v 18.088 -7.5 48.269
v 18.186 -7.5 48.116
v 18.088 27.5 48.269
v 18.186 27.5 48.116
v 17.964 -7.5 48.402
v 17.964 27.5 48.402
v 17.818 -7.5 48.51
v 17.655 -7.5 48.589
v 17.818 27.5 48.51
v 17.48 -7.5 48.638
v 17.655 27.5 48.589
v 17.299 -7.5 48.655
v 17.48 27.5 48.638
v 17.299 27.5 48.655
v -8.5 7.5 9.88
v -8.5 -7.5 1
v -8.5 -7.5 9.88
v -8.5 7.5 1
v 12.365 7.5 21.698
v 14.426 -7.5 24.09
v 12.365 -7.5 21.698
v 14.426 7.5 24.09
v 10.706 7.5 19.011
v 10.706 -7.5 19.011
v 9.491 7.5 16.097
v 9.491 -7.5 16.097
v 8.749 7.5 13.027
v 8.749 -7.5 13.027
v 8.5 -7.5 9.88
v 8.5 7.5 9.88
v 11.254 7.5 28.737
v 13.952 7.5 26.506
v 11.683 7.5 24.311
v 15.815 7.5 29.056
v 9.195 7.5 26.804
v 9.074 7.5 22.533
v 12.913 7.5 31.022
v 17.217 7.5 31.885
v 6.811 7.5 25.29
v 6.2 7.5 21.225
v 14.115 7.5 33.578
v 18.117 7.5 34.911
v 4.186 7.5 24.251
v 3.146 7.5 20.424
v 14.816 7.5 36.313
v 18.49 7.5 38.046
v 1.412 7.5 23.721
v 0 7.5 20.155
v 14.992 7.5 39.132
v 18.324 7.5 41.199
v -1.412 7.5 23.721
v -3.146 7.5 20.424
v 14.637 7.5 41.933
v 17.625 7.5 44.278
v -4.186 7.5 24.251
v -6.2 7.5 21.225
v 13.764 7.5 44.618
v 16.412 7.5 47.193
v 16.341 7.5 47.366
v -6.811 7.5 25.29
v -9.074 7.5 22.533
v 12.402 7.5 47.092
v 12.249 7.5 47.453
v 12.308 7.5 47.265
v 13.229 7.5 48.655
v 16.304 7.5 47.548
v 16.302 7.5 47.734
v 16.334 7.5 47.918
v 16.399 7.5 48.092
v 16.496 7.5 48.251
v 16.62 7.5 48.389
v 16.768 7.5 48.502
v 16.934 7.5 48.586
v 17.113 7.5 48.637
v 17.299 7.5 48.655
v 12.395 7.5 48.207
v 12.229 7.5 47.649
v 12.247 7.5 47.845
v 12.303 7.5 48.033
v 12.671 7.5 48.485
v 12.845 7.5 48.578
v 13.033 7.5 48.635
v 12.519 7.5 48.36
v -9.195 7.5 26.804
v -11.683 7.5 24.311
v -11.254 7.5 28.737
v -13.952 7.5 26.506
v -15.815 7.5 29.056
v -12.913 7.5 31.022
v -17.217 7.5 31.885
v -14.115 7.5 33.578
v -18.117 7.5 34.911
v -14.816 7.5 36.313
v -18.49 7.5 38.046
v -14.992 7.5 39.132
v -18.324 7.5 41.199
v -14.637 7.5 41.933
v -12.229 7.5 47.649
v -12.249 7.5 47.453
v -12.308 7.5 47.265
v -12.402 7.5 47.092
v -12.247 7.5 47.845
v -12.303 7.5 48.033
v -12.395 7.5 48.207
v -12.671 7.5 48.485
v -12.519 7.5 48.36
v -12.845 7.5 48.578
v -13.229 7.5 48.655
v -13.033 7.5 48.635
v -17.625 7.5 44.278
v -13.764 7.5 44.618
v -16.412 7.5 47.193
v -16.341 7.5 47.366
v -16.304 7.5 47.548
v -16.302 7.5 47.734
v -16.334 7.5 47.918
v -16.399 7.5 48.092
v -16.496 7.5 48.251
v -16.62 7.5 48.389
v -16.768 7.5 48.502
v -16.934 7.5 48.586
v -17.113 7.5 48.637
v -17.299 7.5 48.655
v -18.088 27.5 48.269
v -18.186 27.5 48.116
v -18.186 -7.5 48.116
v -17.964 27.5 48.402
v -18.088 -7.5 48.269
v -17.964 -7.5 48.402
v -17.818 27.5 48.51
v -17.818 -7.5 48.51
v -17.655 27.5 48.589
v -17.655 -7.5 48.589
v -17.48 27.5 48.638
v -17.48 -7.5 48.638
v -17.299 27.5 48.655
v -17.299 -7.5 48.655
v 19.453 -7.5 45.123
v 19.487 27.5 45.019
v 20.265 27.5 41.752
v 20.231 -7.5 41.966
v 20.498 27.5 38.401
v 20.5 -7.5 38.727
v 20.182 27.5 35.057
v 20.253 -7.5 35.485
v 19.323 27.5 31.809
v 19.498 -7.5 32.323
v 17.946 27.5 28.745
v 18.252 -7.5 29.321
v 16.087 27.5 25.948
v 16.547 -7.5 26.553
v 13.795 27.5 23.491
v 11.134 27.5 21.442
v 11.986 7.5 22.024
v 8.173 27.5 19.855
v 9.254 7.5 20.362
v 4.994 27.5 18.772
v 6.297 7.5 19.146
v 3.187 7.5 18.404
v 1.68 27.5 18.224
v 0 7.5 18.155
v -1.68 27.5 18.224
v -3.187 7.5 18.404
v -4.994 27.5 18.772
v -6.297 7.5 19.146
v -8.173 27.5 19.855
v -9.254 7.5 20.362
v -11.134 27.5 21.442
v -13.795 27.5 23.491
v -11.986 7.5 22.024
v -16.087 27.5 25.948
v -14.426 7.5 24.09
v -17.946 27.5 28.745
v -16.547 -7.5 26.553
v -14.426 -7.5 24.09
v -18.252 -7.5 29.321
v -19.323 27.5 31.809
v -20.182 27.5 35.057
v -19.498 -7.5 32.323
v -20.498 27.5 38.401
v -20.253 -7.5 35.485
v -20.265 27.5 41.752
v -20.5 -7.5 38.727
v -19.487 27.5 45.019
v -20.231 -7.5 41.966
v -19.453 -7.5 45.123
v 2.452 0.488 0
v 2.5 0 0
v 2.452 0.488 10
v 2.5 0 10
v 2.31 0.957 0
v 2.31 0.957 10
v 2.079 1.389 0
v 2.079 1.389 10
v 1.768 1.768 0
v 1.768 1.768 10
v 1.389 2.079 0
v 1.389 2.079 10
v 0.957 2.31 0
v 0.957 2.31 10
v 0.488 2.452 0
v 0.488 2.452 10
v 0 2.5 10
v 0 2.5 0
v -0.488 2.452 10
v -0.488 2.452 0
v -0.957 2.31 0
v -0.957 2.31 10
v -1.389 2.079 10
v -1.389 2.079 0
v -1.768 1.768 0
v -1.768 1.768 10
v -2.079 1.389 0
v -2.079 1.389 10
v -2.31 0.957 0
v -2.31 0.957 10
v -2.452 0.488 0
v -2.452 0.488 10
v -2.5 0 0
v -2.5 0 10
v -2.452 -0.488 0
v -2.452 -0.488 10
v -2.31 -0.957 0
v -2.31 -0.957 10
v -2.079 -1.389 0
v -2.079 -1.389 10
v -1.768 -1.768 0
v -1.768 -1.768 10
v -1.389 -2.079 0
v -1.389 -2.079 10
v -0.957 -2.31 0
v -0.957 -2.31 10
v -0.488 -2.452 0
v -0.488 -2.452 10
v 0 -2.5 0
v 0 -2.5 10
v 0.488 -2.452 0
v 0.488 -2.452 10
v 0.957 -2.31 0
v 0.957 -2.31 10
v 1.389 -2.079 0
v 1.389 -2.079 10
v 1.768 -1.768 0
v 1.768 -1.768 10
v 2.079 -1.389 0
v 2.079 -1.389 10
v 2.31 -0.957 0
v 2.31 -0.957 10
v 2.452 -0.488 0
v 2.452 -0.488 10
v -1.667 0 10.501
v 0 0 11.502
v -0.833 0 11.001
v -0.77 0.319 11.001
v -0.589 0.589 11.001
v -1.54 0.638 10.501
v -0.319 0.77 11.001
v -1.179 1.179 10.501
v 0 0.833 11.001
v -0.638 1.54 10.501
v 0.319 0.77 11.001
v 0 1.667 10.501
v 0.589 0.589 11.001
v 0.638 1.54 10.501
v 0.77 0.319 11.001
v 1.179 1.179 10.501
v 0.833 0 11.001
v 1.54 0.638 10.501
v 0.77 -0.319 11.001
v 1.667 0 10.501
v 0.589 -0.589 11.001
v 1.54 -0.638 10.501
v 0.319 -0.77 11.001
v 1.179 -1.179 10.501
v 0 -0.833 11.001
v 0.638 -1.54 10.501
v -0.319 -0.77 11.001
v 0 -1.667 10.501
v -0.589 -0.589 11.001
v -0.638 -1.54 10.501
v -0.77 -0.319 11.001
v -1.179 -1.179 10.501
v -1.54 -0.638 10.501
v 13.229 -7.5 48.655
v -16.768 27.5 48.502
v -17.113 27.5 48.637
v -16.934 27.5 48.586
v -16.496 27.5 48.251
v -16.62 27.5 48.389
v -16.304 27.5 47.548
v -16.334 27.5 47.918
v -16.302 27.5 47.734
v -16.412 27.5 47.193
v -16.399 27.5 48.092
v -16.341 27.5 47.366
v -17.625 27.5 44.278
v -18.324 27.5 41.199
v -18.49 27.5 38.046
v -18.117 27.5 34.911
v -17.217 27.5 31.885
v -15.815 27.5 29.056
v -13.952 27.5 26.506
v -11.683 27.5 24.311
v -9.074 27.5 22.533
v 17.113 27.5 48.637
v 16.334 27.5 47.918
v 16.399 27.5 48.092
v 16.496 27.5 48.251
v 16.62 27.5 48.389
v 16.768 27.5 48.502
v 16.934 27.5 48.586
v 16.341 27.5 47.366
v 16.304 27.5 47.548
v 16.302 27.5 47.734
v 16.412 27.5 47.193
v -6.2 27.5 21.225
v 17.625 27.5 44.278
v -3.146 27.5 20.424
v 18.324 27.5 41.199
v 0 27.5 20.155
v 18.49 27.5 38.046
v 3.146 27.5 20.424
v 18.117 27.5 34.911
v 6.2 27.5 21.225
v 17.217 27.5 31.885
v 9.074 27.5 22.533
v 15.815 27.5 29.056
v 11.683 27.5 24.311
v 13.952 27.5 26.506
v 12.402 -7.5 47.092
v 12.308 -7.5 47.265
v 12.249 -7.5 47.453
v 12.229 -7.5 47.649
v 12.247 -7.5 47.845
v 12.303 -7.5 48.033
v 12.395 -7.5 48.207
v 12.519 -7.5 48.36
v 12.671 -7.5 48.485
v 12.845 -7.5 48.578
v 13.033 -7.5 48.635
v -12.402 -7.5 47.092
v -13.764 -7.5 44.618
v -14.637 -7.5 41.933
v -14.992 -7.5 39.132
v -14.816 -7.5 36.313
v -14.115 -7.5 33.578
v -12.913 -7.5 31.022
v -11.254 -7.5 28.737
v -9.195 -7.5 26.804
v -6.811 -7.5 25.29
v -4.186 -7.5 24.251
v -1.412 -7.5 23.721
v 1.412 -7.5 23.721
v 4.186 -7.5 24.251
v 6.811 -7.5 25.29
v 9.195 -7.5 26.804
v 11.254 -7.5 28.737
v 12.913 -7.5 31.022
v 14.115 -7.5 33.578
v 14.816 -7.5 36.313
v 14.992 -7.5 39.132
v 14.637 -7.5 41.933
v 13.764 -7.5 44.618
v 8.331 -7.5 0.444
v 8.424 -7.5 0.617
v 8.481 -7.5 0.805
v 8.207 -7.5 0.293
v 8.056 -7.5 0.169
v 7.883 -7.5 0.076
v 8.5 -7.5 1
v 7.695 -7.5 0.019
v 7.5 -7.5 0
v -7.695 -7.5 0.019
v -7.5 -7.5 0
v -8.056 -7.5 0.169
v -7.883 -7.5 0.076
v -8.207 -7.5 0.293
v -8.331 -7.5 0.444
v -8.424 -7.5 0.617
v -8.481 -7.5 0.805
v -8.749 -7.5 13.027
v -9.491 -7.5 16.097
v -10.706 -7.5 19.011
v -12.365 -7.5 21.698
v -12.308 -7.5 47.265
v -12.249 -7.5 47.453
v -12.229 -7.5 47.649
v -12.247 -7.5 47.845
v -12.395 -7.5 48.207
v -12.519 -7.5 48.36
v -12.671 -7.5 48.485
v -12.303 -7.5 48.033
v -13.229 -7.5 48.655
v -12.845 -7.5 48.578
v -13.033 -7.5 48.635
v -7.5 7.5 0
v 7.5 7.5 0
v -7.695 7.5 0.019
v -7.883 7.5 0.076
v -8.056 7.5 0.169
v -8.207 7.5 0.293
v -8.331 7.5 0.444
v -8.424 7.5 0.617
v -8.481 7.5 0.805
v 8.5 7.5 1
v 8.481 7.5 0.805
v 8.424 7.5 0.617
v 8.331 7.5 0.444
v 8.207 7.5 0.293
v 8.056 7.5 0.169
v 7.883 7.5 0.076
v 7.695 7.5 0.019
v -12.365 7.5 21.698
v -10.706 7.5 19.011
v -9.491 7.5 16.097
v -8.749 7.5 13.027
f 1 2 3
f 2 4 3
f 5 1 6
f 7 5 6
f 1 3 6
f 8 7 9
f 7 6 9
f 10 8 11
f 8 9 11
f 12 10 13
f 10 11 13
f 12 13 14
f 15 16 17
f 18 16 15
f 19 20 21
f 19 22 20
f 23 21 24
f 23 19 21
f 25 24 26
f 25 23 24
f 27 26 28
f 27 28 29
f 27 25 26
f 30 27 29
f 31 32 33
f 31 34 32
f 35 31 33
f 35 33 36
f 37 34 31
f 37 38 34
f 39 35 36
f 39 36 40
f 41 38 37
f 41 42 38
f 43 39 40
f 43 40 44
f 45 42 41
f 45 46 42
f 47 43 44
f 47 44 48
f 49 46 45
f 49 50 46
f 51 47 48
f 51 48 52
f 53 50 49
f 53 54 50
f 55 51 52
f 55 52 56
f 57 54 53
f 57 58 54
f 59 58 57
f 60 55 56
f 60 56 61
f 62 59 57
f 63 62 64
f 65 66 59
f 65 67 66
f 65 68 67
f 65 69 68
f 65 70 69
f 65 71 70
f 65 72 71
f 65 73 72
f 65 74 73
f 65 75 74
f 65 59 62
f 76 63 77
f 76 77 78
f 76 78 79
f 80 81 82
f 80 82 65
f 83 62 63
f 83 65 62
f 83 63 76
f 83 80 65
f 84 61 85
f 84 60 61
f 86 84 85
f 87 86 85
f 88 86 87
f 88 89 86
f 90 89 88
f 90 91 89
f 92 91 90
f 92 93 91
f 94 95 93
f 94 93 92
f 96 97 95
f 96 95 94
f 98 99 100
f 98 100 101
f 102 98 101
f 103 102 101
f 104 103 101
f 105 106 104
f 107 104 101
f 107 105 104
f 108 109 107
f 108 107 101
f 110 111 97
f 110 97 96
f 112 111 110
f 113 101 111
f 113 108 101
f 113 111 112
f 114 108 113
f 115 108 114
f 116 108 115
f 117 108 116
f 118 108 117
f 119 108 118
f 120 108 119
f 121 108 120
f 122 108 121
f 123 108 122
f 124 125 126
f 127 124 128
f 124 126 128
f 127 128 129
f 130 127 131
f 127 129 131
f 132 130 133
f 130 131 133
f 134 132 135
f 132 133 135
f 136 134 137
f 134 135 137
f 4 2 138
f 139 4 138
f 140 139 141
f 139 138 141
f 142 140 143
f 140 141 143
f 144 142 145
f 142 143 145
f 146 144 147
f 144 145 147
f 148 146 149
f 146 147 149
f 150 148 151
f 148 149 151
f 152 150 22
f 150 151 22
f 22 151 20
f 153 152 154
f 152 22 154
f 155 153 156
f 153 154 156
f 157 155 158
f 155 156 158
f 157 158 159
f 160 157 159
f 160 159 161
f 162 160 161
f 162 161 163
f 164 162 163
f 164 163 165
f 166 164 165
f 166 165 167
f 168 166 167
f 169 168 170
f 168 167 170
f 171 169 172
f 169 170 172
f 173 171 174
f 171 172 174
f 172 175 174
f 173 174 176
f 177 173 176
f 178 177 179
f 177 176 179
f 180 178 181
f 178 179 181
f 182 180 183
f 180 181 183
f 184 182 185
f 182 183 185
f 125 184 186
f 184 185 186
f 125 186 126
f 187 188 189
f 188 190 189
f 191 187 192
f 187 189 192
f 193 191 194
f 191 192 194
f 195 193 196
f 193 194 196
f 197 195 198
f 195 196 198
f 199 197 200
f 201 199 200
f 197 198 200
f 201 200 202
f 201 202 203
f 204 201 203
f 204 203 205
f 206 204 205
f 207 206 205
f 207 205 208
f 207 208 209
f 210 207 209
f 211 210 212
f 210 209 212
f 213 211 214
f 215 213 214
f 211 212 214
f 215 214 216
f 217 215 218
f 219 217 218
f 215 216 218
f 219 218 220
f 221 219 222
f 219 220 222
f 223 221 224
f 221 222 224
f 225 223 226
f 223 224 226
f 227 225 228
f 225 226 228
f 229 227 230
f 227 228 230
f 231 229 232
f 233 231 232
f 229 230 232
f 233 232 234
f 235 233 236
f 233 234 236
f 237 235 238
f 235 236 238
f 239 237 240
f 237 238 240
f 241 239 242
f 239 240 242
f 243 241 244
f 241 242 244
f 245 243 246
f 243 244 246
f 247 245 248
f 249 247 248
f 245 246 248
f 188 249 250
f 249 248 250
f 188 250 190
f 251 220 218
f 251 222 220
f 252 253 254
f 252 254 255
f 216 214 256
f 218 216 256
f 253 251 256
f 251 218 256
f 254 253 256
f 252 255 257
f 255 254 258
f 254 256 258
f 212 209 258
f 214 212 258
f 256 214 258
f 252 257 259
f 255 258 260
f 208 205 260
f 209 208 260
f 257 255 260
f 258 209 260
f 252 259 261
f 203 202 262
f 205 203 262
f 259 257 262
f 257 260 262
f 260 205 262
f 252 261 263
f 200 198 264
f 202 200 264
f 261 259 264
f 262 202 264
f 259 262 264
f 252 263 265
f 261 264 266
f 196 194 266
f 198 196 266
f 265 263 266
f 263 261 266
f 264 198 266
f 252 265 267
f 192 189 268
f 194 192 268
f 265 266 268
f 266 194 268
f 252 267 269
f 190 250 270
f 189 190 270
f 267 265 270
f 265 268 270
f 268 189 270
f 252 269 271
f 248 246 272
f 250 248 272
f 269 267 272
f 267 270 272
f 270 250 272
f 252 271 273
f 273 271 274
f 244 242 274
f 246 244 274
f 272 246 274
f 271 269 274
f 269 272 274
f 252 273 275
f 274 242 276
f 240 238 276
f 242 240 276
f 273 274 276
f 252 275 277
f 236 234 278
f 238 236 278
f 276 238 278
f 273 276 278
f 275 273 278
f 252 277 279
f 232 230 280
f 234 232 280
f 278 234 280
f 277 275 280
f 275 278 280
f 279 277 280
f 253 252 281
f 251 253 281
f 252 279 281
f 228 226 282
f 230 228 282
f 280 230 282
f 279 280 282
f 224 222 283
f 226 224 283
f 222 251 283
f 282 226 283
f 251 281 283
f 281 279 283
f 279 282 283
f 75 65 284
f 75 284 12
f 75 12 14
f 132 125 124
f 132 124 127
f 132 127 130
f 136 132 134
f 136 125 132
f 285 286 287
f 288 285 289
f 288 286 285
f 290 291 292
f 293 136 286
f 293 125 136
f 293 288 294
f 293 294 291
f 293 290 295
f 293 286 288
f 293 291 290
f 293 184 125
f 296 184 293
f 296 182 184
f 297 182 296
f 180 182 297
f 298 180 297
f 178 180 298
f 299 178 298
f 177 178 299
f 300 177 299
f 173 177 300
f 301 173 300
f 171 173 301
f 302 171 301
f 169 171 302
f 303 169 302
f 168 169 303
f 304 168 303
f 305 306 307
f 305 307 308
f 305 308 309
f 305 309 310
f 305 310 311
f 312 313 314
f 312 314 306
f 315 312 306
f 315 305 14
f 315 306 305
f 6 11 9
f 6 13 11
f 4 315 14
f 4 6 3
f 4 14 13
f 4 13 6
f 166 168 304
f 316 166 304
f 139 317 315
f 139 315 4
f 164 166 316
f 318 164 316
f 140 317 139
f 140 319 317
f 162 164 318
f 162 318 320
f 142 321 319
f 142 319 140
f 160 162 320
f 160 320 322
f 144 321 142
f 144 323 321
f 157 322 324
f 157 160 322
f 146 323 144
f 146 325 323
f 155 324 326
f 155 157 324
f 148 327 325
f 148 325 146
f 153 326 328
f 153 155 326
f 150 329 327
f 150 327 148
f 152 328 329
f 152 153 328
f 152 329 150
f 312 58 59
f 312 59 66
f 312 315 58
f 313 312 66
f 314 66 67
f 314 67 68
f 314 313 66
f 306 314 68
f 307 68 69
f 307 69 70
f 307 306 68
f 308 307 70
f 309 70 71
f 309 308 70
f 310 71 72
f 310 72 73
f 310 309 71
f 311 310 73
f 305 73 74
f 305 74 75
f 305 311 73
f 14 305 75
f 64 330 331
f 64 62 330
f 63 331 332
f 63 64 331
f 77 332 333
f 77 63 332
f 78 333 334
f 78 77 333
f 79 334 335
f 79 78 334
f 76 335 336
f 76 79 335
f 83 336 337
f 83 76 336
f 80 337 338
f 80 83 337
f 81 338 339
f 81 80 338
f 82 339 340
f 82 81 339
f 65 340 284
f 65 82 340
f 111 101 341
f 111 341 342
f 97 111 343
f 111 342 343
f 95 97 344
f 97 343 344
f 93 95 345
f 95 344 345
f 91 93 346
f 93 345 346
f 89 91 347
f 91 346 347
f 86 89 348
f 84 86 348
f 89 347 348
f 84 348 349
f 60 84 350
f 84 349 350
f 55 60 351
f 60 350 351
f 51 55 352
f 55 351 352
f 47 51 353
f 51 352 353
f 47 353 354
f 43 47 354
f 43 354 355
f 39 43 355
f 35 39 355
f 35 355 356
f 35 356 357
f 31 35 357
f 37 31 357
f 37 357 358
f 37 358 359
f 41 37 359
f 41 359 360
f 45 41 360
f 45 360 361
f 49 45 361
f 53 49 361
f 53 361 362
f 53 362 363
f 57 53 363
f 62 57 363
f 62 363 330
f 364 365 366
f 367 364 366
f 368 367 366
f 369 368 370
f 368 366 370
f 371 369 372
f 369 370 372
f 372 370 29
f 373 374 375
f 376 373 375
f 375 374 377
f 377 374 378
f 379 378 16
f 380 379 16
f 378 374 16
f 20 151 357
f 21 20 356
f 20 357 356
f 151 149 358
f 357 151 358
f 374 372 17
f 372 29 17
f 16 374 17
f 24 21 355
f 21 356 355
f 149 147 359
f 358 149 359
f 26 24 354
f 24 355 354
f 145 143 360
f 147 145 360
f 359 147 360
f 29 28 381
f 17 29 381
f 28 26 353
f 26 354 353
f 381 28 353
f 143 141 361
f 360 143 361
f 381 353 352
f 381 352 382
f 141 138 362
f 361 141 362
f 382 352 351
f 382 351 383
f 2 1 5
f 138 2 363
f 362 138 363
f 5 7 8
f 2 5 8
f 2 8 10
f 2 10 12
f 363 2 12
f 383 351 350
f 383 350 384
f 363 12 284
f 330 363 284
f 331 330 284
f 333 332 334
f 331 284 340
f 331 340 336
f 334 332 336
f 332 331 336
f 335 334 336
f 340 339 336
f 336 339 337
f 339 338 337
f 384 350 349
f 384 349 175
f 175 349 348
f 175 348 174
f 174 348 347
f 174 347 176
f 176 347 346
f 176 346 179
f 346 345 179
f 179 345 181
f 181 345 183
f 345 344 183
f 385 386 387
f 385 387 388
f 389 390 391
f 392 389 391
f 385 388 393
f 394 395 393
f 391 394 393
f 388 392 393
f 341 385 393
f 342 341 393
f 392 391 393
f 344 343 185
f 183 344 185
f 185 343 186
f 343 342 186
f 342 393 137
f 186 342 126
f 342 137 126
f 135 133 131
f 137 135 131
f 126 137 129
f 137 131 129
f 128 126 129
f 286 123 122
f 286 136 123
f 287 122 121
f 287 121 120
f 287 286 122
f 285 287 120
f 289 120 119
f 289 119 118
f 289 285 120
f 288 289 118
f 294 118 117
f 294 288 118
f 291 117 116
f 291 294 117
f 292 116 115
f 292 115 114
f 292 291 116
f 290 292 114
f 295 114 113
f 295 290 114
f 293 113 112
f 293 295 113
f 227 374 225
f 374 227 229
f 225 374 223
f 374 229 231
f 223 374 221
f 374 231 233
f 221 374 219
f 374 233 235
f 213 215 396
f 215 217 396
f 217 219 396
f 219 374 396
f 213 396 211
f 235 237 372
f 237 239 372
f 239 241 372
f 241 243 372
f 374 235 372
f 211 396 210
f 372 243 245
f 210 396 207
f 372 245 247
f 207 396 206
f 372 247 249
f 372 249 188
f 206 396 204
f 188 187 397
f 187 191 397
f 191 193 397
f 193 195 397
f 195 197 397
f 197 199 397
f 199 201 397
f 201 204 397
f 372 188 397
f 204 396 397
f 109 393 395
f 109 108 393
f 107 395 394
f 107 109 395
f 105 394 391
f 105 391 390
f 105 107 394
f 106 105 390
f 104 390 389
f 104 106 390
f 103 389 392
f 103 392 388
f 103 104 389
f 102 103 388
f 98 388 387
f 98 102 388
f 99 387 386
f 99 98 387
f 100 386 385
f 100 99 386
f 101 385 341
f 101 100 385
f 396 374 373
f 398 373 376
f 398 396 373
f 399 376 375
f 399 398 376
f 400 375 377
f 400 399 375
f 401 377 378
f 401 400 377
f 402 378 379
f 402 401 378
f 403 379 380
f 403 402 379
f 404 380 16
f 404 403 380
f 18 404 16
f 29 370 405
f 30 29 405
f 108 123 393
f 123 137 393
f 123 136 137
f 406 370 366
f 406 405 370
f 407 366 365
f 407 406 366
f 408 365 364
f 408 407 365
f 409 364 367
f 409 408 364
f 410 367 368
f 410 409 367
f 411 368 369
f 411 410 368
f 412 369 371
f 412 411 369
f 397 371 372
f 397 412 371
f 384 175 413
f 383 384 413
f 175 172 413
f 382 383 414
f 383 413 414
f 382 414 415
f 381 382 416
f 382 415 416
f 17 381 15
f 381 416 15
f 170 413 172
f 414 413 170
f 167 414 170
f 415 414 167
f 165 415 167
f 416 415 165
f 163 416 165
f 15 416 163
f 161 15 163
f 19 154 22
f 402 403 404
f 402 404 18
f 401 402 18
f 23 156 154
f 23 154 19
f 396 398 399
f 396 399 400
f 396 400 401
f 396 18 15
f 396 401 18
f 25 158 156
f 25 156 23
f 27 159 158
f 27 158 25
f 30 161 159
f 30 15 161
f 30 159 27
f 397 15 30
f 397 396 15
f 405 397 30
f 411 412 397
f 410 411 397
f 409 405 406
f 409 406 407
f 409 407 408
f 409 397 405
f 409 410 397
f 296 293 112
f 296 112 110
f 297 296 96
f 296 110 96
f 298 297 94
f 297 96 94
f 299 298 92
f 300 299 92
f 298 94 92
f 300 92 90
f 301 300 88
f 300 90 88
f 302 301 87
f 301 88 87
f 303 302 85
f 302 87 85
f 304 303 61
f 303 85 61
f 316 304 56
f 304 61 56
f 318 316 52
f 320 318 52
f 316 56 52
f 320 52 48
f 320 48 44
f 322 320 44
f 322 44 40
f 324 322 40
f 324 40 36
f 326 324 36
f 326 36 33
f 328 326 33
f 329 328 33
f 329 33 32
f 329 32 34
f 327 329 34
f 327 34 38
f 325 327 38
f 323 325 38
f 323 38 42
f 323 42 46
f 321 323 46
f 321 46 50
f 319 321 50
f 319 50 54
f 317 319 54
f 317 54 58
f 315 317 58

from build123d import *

# Parameters (mm, degrees)
ESQUISSE1_W                    = 17
ESQUISSE1_H                    = 15
BOSS_EXTRU_1_DEPTH             = 20
TROUS_DE_CENTRAGE_5_0MM1_D     = 5
TROUS_DE_CENTRAGE_5_0MM1_DEPTH = 10
TROUS_DE_CENTRAGE_5_0MM1_TIP   = 1.5021515475689007
BOSS_EXTRU_2_DEPTH             = 20
BOSS_EXTRU_3_START             = 15
BOSS_EXTRU_3_DEPTH             = 15
CONG_1_R                       = 19.999999999999996
CONG_2_R                       = 1


with BuildPart() as part:
    # Esquisse1 → Boss.-Extru.1 (new body)
    with BuildSketch(Plane.XY):
        Rectangle(ESQUISSE1_W, ESQUISSE1_H)
    extrude(amount=BOSS_EXTRU_1_DEPTH)

    # Trous de centrage Ø5.0mm1
    with Locations(Plane(origin=(0, 0, 0), x_dir=(-1, 0, 0), z_dir=(0, 0, -1))):
        with Locations((0, 0)):
            Hole(TROUS_DE_CENTRAGE_5_0MM1_D / 2, depth=TROUS_DE_CENTRAGE_5_0MM1_DEPTH)
            with Locations((0, 0, -(TROUS_DE_CENTRAGE_5_0MM1_DEPTH + TROUS_DE_CENTRAGE_5_0MM1_TIP / 2))):  # 118° drill point
                Cone(0, TROUS_DE_CENTRAGE_5_0MM1_D / 2, TROUS_DE_CENTRAGE_5_0MM1_TIP, mode=Mode.SUBTRACT)

    # Esquisse4 → Boss.-Extru.2 (add)
    with BuildSketch(Plane(origin=(0, 7.499999999999998, 0), x_dir=(1, 0, 0), z_dir=(0, 1, 0))):
        with BuildLine():
            Line((-17.89553016817328, -48.65475810617763), (-15.56438241627338, -48.65475810617763))
            ThreePointArc((-15.56438241627338, -48.65475810617763), (-6e-16, -20.15475810617762), (15.564382416273377, -48.65475810617763))
            Line((15.564382416273377, -48.65475810617763), (17.895530168173273, -48.65475810617763))
            ThreePointArc((17.895530168173273, -48.65475810617763), (-4.8e-16, -18.154758106177628), (-17.89553016817328, -48.65475810617763))
        make_face()
    extrude(amount=BOSS_EXTRU_2_DEPTH)

    # Esquisse5 → Boss.-Extru.3 (add)
    with BuildSketch(Plane.XZ.offset(-7.499999999999998).offset(BOSS_EXTRU_3_START)):
        with BuildLine():
            Line((-15.564382416273382, 48.65475810617763), (-11.180339887498954, 48.654758106177624))
            ThreePointArc((-11.180339887498954, 48.654758106177624), (-4.49e-15, 23.65475810617762), (11.180339887498954, 48.654758106177624))
            Line((11.180339887498954, 48.654758106177624), (15.564382416273377, 48.65475810617763))
            Line((15.564382416273377, 48.65475810617763), (17.895530168173273, 48.65475810617763))
            ThreePointArc((17.895530168173273, 48.65475810617763), (19.479599424670532, 32.26764559312642), (8.499999999999998, 20))
            Line((8.499999999999998, 20), (-8.49999999999999, 20))
            ThreePointArc((-8.49999999999999, 20), (-19.47959942467054, 32.26764559312641), (-17.89553016817328, 48.65475810617763))
            Line((-17.89553016817328, 48.65475810617763), (-15.564382416273382, 48.65475810617763))
        make_face()
    extrude(amount=-BOSS_EXTRU_3_DEPTH)

    # Congé1
    cong_1_edges = [part.edges().sort_by_distance(p)[0] for p in [
        (-8.500000000000002, -1.78e-15, 20),
        (8.499999999999998, -1.78e-15, 20),
    ]]
    fillet(cong_1_edges, radius=CONG_1_R)

    # Congé2
    cong_2_edges = [part.edges().sort_by_distance(p)[0] for p in [
        (-17.89553016817328, 9.999999999999998, 48.654758106177624),
        (17.895530168173273, 10, 48.65475810617764),
        (15.564382416273379, 17.5, 48.65475810617763),
        (-15.564382416273382, 17.5, 48.65475810617763),
        (11.180339887498956, -1.78e-15, 48.654758106177624),
        (-11.180339887498954, -1.78e-15, 48.654758106177624),
        (-8.500000000000002, -1.78e-15, 0),
        (8.499999999999998, -1.78e-15, 0),
    ]]
    fillet(cong_2_edges, radius=CONG_2_R - 0.0001)  # a hair under: the kernel refuses the full size


solid = part.part
